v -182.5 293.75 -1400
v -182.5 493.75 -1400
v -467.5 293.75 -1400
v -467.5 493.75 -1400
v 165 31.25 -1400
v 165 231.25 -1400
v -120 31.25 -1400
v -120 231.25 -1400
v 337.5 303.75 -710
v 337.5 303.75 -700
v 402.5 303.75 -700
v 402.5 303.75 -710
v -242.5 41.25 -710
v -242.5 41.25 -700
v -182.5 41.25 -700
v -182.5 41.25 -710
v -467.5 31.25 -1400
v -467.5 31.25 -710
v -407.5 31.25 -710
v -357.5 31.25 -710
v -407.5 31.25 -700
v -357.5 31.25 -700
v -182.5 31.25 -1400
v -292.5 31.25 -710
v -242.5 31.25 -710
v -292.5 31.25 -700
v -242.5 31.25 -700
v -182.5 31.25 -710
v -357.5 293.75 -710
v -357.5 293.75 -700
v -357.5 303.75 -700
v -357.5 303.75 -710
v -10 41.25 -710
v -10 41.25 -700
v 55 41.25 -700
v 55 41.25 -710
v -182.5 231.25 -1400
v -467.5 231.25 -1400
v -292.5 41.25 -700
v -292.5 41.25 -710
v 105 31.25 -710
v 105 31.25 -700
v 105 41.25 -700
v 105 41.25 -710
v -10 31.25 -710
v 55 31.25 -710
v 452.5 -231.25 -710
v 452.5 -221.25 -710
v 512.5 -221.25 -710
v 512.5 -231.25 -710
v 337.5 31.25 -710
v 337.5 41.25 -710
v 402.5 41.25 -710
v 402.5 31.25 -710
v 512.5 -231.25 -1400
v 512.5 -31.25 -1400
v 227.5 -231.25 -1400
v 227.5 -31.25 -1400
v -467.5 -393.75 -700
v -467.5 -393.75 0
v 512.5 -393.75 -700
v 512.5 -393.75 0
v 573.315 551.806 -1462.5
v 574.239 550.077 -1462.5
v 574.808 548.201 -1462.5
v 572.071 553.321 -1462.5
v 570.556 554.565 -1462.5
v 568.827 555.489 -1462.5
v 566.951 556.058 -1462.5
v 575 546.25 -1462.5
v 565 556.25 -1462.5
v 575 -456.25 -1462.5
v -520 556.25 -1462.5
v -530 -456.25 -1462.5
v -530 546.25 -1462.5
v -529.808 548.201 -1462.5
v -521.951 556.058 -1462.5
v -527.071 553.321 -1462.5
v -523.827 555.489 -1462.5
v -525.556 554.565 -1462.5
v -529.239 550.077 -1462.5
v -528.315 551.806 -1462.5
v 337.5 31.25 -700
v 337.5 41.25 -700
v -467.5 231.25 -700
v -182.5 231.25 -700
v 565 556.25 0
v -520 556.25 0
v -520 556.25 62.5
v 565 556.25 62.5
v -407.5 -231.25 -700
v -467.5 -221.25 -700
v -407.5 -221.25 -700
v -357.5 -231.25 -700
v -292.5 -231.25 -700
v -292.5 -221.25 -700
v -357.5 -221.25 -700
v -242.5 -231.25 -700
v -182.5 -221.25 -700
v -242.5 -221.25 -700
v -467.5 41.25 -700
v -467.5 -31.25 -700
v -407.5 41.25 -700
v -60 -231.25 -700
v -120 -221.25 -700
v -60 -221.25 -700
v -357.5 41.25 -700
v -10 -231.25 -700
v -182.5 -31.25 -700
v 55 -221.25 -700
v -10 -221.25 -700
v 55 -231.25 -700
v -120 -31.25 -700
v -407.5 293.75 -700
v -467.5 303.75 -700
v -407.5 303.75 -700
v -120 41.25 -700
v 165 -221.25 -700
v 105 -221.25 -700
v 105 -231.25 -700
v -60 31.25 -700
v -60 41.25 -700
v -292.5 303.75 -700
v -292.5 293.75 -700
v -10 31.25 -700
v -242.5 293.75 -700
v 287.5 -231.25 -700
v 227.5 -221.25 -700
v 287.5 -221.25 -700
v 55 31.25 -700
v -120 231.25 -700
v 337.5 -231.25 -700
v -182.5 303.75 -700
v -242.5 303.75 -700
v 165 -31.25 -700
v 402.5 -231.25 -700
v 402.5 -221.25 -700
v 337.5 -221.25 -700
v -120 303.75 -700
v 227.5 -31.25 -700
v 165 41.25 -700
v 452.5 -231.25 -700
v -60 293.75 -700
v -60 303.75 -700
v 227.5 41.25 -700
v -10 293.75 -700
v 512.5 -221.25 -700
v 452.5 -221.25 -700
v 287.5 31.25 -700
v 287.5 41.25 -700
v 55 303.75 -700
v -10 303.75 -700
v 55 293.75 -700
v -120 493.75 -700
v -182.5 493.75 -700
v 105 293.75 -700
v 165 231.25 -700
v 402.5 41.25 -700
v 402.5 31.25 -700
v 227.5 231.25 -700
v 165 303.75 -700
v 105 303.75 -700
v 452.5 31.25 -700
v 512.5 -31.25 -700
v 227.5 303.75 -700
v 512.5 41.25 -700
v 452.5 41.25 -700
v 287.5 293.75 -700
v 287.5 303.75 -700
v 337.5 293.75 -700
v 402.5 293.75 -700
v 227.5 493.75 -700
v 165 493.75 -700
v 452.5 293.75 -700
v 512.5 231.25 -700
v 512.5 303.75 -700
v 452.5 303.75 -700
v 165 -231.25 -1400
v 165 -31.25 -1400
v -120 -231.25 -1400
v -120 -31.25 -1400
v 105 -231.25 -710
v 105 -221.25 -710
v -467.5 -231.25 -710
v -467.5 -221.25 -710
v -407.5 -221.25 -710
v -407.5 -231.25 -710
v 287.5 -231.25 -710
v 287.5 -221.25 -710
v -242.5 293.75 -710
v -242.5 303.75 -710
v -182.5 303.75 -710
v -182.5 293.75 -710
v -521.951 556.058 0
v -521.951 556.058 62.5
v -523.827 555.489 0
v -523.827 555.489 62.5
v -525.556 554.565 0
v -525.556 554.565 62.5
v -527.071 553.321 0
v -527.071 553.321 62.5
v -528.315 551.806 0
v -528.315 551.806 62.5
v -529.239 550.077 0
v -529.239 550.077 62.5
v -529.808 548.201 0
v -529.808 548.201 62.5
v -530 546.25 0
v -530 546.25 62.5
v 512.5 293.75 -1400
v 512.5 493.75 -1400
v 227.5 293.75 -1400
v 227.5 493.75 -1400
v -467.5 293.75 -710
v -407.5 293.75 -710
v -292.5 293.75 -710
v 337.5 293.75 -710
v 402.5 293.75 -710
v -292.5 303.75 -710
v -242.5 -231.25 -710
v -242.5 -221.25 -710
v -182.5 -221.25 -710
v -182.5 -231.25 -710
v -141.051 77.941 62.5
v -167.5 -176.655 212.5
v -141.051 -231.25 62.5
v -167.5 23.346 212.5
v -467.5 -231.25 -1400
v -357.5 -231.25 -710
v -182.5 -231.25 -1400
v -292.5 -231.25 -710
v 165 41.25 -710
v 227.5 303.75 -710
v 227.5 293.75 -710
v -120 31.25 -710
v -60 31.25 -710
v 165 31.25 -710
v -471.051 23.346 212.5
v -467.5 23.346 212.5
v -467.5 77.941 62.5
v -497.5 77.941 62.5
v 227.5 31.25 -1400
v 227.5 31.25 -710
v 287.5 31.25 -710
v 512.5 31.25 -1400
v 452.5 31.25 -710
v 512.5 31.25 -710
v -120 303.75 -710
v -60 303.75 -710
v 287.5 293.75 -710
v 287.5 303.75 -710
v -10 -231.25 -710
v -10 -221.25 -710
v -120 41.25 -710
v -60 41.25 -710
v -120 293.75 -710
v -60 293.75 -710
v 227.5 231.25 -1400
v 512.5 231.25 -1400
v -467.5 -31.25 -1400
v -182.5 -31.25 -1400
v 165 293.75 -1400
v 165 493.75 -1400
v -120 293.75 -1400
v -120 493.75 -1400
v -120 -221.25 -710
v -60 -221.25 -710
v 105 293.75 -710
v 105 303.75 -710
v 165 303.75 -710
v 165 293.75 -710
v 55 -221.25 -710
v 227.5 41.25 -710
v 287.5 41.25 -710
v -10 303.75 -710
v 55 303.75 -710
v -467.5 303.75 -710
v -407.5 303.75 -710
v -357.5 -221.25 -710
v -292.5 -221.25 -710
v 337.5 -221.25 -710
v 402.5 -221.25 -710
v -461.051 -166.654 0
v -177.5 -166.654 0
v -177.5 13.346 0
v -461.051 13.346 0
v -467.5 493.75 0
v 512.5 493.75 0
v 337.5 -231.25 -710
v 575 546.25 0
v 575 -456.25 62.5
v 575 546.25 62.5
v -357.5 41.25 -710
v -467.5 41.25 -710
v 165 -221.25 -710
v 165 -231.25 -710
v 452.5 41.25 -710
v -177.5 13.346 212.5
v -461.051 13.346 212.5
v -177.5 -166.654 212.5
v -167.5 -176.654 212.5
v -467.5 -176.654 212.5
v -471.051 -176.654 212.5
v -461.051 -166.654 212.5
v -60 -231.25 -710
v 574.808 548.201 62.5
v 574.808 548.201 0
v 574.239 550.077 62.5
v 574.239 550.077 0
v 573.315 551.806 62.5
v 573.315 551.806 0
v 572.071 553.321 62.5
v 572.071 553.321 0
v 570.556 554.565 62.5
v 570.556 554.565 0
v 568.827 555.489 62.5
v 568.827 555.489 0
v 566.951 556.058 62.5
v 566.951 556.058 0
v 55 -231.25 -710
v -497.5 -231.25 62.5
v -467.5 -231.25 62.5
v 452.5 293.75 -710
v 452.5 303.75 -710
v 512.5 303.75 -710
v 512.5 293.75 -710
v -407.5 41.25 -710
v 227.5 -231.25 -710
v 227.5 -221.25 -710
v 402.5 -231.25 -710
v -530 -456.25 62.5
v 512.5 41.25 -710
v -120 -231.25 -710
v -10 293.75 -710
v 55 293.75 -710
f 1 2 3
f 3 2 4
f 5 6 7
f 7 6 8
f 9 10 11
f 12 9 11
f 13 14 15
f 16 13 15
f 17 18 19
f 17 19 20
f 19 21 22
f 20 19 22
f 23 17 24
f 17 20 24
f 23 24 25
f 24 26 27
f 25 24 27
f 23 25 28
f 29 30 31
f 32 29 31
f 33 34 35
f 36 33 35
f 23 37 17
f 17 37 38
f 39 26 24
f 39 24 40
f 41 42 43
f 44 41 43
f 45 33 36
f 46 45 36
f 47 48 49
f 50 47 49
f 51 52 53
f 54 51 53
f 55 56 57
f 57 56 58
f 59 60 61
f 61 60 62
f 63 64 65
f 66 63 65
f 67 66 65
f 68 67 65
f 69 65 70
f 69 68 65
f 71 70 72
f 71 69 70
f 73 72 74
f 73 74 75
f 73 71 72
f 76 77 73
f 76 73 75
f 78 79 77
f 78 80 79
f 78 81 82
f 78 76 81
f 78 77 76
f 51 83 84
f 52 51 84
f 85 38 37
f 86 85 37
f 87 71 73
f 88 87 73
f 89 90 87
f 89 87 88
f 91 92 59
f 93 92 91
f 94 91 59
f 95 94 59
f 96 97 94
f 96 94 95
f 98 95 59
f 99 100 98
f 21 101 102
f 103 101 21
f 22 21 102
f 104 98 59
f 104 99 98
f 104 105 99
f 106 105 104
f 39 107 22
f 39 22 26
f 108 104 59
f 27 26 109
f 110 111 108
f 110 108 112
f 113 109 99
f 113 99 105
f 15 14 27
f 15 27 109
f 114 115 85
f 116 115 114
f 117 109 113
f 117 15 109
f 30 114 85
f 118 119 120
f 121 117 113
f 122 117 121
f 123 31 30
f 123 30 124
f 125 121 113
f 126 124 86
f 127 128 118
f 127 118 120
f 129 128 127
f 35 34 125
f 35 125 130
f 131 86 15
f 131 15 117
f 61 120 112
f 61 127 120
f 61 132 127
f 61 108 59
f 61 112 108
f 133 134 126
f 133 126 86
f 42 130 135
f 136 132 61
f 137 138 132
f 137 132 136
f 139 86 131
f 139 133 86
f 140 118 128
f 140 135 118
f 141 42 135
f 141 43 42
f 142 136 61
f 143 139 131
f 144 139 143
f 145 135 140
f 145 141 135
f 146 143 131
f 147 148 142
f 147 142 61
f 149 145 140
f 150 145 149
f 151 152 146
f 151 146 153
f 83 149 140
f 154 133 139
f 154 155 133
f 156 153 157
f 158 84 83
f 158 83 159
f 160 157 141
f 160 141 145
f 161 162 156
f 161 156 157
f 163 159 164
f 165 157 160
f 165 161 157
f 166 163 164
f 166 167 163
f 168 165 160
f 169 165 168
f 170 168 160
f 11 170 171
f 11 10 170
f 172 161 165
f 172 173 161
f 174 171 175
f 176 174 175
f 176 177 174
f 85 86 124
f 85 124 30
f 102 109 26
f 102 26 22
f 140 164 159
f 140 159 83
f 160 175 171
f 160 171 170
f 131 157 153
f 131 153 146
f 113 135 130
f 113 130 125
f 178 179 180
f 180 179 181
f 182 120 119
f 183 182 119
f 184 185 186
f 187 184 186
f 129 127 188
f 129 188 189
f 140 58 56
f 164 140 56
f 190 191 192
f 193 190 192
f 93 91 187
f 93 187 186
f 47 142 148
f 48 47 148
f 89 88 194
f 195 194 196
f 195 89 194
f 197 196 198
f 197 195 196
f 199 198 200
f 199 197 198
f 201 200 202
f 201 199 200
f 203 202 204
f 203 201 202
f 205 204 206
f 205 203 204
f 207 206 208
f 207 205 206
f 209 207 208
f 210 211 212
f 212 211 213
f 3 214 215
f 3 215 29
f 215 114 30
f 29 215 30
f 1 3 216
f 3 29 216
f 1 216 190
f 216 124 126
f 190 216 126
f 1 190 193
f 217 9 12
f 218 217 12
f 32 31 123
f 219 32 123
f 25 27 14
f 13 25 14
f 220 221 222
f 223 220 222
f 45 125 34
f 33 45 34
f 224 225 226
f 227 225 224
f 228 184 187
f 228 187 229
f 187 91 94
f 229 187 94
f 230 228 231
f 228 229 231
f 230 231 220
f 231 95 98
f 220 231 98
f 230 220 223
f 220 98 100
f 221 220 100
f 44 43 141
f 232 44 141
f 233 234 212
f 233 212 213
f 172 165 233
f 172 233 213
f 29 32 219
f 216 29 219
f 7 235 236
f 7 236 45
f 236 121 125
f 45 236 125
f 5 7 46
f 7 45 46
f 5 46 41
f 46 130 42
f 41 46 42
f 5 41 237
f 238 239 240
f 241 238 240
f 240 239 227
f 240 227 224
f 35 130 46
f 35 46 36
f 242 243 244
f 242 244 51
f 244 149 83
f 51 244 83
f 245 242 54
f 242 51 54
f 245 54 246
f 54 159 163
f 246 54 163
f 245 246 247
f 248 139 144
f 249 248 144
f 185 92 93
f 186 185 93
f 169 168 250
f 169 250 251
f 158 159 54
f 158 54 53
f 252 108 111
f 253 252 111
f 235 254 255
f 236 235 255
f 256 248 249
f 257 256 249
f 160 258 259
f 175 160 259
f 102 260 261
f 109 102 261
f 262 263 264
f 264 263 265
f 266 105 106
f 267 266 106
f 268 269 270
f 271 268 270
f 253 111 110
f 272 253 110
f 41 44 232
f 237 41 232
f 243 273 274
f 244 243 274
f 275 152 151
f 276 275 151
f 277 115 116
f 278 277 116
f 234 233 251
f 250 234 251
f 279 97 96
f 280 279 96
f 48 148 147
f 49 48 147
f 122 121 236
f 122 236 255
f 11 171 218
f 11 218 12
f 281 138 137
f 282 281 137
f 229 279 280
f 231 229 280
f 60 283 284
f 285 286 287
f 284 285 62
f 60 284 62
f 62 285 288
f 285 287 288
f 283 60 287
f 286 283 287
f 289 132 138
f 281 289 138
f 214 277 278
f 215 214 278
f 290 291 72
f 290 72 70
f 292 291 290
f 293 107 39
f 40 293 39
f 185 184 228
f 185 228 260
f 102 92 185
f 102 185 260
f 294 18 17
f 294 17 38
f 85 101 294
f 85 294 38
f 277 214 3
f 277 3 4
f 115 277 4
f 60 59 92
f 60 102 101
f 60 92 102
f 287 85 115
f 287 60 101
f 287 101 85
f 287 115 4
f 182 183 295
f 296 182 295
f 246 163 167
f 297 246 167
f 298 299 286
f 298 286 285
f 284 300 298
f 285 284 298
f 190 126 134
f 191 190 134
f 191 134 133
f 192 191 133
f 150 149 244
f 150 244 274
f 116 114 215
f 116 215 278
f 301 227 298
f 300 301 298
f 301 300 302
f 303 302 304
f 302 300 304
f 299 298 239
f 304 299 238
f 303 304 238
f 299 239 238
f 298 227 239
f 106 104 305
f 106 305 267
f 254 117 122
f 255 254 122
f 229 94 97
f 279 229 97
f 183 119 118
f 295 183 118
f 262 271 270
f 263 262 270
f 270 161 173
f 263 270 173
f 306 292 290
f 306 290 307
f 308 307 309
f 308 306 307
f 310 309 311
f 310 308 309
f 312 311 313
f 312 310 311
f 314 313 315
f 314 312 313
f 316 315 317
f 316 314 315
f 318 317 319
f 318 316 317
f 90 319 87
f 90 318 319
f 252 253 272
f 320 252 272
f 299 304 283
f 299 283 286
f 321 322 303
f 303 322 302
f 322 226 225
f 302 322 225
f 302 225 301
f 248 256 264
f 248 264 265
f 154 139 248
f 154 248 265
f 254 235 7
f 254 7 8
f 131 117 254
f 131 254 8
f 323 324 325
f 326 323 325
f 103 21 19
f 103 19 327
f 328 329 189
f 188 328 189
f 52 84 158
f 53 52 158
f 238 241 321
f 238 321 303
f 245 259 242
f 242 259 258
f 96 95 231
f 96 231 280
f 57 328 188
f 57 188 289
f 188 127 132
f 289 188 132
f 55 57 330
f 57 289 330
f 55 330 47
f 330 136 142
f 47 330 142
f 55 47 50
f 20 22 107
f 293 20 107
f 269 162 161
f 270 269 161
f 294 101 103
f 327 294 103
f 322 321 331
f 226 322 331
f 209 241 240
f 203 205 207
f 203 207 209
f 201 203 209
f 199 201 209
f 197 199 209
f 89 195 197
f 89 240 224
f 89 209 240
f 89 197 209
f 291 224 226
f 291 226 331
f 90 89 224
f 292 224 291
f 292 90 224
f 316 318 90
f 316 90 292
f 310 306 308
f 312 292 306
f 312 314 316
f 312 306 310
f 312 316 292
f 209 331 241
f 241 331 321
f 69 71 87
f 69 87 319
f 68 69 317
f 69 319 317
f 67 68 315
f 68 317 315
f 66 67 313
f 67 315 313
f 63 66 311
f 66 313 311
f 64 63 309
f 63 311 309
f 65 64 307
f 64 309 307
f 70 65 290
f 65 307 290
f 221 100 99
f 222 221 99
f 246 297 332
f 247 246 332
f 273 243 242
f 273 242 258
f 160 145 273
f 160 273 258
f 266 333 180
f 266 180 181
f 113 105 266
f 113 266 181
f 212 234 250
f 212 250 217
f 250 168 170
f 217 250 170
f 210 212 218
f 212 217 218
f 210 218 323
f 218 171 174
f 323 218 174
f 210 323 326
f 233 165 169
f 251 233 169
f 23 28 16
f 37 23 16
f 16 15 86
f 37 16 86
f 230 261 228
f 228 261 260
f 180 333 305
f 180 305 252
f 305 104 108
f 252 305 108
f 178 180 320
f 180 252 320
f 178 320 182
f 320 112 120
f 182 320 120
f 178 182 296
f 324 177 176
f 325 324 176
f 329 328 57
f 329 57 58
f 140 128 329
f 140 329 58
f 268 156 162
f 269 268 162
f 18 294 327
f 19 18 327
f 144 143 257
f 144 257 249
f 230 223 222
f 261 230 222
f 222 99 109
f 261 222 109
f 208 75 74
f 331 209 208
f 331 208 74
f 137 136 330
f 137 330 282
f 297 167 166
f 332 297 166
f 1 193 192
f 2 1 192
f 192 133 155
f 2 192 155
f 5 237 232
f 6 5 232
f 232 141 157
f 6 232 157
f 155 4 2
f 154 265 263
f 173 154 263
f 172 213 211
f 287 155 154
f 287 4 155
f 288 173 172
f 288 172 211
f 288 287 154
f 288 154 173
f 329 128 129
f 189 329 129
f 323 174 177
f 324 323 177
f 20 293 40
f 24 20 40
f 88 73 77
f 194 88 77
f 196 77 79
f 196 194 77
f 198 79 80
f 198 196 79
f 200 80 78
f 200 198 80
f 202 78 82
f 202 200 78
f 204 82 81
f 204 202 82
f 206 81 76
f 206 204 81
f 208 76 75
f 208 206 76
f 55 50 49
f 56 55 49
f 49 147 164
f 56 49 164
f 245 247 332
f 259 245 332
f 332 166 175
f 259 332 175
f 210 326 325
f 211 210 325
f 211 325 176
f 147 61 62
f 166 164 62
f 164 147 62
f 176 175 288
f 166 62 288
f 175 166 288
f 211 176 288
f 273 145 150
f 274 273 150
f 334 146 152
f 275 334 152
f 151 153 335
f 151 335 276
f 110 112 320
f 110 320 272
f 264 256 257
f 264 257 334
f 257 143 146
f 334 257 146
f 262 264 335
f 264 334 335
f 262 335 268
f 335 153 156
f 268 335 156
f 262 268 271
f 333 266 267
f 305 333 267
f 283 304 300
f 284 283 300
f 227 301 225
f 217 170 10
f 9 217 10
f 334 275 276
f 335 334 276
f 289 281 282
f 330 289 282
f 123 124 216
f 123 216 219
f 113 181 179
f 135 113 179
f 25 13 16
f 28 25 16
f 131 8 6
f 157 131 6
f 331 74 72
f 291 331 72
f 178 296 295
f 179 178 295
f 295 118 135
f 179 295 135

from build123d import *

# Parameters (mm, degrees)
SKETCH1_W           = 1105
SKETCH1_H           = 1012.5
SKETCH1_W_2         = 285
SKETCH1_H_2         = 200
SKETCH1_W_3         = 980
SKETCH1_H_3         = 100
BOSS_EXTRUDE1_DEPTH = 1400
SKETCH2_W           = 1105
SKETCH2_H           = 1012.5
BOSS_EXTRUDE3_DEPTH = 62.5
SKETCH3_W           = 980
SKETCH3_H           = 887.5
CUT_EXTRUDE1_DEPTH  = 700
BOSS_EXTRUDE4_REACH = 1107.19
SKETCH5_W           = 980
SKETCH5_H           = 100
SKETCH4_W           = 65
SKETCH4_H           = 10
SKETCH4_W_2         = 60
BOSS_EXTRUDE5_DEPTH = 10
FILLET1_R           = 10
BOSS_EXTRUDE6_START = 62.5
BOSS_EXTRUDE6_DEPTH = 62.5
BOSS_EXTRUDE7_START = -62.5
BOSS_EXTRUDE7_DEPTH = 300
CHAMFER3_SIZE2      = 150
CHAMFER3_SIZE       = 26.449047106
CHAMFER4_SIZE       = 30
CHAMFER4_SIZE_2     = 170.138454589
SKETCH14_W          = 283.550952894
SKETCH14_H          = 180
CUT_EXTRUDE4_DEPTH  = 259


# Some blends are built 0.0001 mm under size
with BuildPart() as part:
    # Sketch1 → Boss-Extrude1 (new body)
    with BuildSketch(Plane.XY):
        with Locations((22.5, 50)):
            Rectangle(SKETCH1_W, SKETCH1_H)
        with Locations((370, 131.25)):
            Rectangle(SKETCH1_W_2, SKETCH1_H_2, mode=Mode.SUBTRACT)
        with Locations((370, 393.75)):
            Rectangle(SKETCH1_W_2, SKETCH1_H_2, mode=Mode.SUBTRACT)
        with Locations((22.5, 393.75)):
            Rectangle(SKETCH1_W_2, SKETCH1_H_2, mode=Mode.SUBTRACT)
        with Locations((-325, 393.75)):
            Rectangle(SKETCH1_W_2, SKETCH1_H_2, mode=Mode.SUBTRACT)
        with Locations((-325, 131.25)):
            Rectangle(SKETCH1_W_2, SKETCH1_H_2, mode=Mode.SUBTRACT)
        with Locations((-325, -131.25)):
            Rectangle(SKETCH1_W_2, SKETCH1_H_2, mode=Mode.SUBTRACT)
        with Locations((22.5, -343.75)):
            Rectangle(SKETCH1_W_3, SKETCH1_H_3, mode=Mode.SUBTRACT)
        with Locations((370, -131.25)):
            Rectangle(SKETCH1_W_2, SKETCH1_H_2, mode=Mode.SUBTRACT)
        with Locations((22.5, -131.25)):
            Rectangle(SKETCH1_W_2, SKETCH1_H_2, mode=Mode.SUBTRACT)
        with Locations((22.5, 131.25)):
            Rectangle(SKETCH1_W_2, SKETCH1_H_2, mode=Mode.SUBTRACT)
    extrude(amount=-BOSS_EXTRUDE1_DEPTH)

    # Sketch2 → Boss-Extrude3 (add)
    with BuildSketch(Plane(origin=(0, 0, -1400), x_dir=(-1, 0, 0), z_dir=(0, 0, -1))):
        with Locations((-22.5, 50)):
            Rectangle(SKETCH2_W, SKETCH2_H)
    extrude(amount=BOSS_EXTRUDE3_DEPTH)

    # Sketch3 → Cut-Extrude1 (cut)
    with BuildSketch(Plane.XY):
        with Locations((22.5, 50)):
            Rectangle(SKETCH3_W, SKETCH3_H)
    extrude(amount=-CUT_EXTRUDE1_DEPTH, mode=Mode.SUBTRACT)

    # Sketch5 → Boss-Extrude4 (add, up to next)
    with BuildSketch(Plane.XY.offset(-700), mode=Mode.PRIVATE) as boss_extrude4_sk1:
        with Locations((22.5, -343.75)):
            Rectangle(SKETCH5_W, SKETCH5_H)
    boss_extrude4_tool1 = extrude(boss_extrude4_sk1.sketch, amount=-BOSS_EXTRUDE4_REACH, mode=Mode.PRIVATE) - part.part
    add(boss_extrude4_tool1.solids().sort_by_distance((22.5, -343.75, -700))[0])

    # Sketch4 → Boss-Extrude5 (add)
    with BuildSketch(Plane.XY.offset(-700)):
        with Locations((-325, 298.75)):
            Rectangle(SKETCH4_W, SKETCH4_H)
        with Locations((-437.5, 298.75)):
            Rectangle(SKETCH4_W_2, SKETCH4_H)
        with Locations((-212.5, 298.75)):
            Rectangle(SKETCH4_W_2, SKETCH4_H)
        with Locations((-90, 298.75)):
            Rectangle(SKETCH4_W_2, SKETCH4_H)
        with Locations((22.5, 298.75)):
            Rectangle(SKETCH4_W, SKETCH4_H)
        with Locations((135, 298.75)):
            Rectangle(SKETCH4_W_2, SKETCH4_H)
        with Locations((257.5, 298.75)):
            Rectangle(SKETCH4_W_2, SKETCH4_H)
        with Locations((370, 298.75)):
            Rectangle(SKETCH4_W, SKETCH4_H)
        with Locations((482.5, 298.75)):
            Rectangle(SKETCH4_W_2, SKETCH4_H)
        with Locations((-437.5, 36.25)):
            Rectangle(SKETCH4_W_2, SKETCH4_H)
        with Locations((-325, 36.25)):
            Rectangle(SKETCH4_W, SKETCH4_H)
        with Locations((-212.5, 36.25)):
            Rectangle(SKETCH4_W_2, SKETCH4_H)
        with Locations((-90, 36.25)):
            Rectangle(SKETCH4_W_2, SKETCH4_H)
        with Locations((22.5, 36.25)):
            Rectangle(SKETCH4_W, SKETCH4_H)
        with Locations((135, 36.25)):
            Rectangle(SKETCH4_W_2, SKETCH4_H)
        with Locations((257.5, 36.25)):
            Rectangle(SKETCH4_W_2, SKETCH4_H)
        with Locations((370, 36.25)):
            Rectangle(SKETCH4_W, SKETCH4_H)
        with Locations((482.5, 36.25)):
            Rectangle(SKETCH4_W_2, SKETCH4_H)
        with Locations((-437.5, -226.25)):
            Rectangle(SKETCH4_W_2, SKETCH4_H)
        with Locations((-325, -226.25)):
            Rectangle(SKETCH4_W, SKETCH4_H)
        with Locations((-212.5, -226.25)):
            Rectangle(SKETCH4_W_2, SKETCH4_H)
        with Locations((-90, -226.25)):
            Rectangle(SKETCH4_W_2, SKETCH4_H)
        with Locations((22.5, -226.25)):
            Rectangle(SKETCH4_W, SKETCH4_H)
        with Locations((135, -226.25)):
            Rectangle(SKETCH4_W_2, SKETCH4_H)
        with Locations((257.5, -226.25)):
            Rectangle(SKETCH4_W_2, SKETCH4_H)
        with Locations((370, -226.25)):
            Rectangle(SKETCH4_W, SKETCH4_H)
        with Locations((482.5, -226.25)):
            Rectangle(SKETCH4_W_2, SKETCH4_H)
    extrude(amount=-BOSS_EXTRUDE5_DEPTH)

    # Fillet1
    fillet1_edges = [part.edges().sort_by_distance(p)[0] for p in [
        (-530, 556.25, -731.25),
        (575, 556.25, -731.25),
    ]]
    fillet(fillet1_edges, radius=FILLET1_R)

    # Sketch6 → Boss-Extrude6 (add)
    with BuildSketch(Plane.XY.offset(BOSS_EXTRUDE6_START)):
        with BuildLine():
            Line((-530, -456.25), (575, -456.25))
            Line((575, -456.25), (575, 546.25))
            ThreePointArc((575, 546.25), (572.071067812, 553.321067812), (565, 556.25))
            Line((565, 556.25), (-520, 556.25))
            ThreePointArc((-520, 556.25), (-527.071067812, 553.321067812), (-530, 546.25))
            Line((-530, 546.25), (-530, -456.25))
        make_face()
    extrude(amount=-BOSS_EXTRUDE6_DEPTH)

    # Sketch8 → Boss-Extrude7 (add)
    with BuildSketch(Plane.ZY.offset(530).offset(BOSS_EXTRUDE7_START)):
        Polygon((62.5, 77.94107028), (212.5, 23.34553514), (212.5, -176.65446486), (62.5, -231.25), align=None)
    extrude(amount=-BOSS_EXTRUDE7_DEPTH)

    # Chamfer3
    chamfer3_edges = [part.edges().sort_by_distance(p)[0] for p in [
        (-167.5, -76.65446486, 62.5),
    ]]
    chamfer3_side = [part.faces().sort_by_distance(p)[0] for p in [
        (-166.971019058, -76.65446486, 62.5),
    ]]
    chamfer(chamfer3_edges, length=CHAMFER3_SIZE - 0.0001, length2=CHAMFER3_SIZE2 - 0.0001, reference=chamfer3_side[0])  # a hair under: the kernel refuses the full size

    # Chamfer4
    # the kernel refuses this chamfer: 170.138454589, 30 mm, written as the material it adds along each edge
    with BuildSketch(Plane(origin=(-467.5, -673.361375011, 62.5), x_dir=(-0.9776715712462578, 0, -0.21013876076743535), z_dir=(0, 1, 0))) as chamfer4_piece_1_section:
        Polygon((CHAMFER4_SIZE * 0.977671571246, CHAMFER4_SIZE * 0.210138760767), (-CHAMFER4_SIZE_2 * 0.210138760767, CHAMFER4_SIZE_2 * 0.977671571244), (0, 0), align=None)
    chamfer4_piece_1 = extrude(amount=1193.413820303, mode=Mode.PRIVATE)
    chamfer4_piece_1 = split(chamfer4_piece_1, bisect_by=Plane(origin=(-476.496724396, -196.562071995, 157.804298923), z_dir=(0, 0.9396926207859072, -0.34202014332567215)), keep=Keep.TOP, mode=Mode.PRIVATE)
    chamfer4_piece_1 = split(chamfer4_piece_1, bisect_by=Plane(origin=(-476.496724396, 43.253142274, 157.804298923), z_dir=(0, -0.9396926207859073, -0.3420201433256722)), keep=Keep.TOP, mode=Mode.PRIVATE)
    chamfer4_piece_1 = split(chamfer4_piece_1, bisect_by=Plane(origin=(-476.496724396, -76.65446486, 212.5), z_dir=(0, 0, -1)), keep=Keep.TOP, mode=Mode.PRIVATE)
    add(chamfer4_piece_1)

    # Sketch14 → Cut-Extrude4 (cut)
    with BuildSketch(Plane.XY.offset(212.5)):
        with Locations((-319.275476447, -76.65446486)):
            Rectangle(SKETCH14_W, SKETCH14_H)
    extrude(amount=-CUT_EXTRUDE4_DEPTH, mode=Mode.SUBTRACT)


solid = part.part
